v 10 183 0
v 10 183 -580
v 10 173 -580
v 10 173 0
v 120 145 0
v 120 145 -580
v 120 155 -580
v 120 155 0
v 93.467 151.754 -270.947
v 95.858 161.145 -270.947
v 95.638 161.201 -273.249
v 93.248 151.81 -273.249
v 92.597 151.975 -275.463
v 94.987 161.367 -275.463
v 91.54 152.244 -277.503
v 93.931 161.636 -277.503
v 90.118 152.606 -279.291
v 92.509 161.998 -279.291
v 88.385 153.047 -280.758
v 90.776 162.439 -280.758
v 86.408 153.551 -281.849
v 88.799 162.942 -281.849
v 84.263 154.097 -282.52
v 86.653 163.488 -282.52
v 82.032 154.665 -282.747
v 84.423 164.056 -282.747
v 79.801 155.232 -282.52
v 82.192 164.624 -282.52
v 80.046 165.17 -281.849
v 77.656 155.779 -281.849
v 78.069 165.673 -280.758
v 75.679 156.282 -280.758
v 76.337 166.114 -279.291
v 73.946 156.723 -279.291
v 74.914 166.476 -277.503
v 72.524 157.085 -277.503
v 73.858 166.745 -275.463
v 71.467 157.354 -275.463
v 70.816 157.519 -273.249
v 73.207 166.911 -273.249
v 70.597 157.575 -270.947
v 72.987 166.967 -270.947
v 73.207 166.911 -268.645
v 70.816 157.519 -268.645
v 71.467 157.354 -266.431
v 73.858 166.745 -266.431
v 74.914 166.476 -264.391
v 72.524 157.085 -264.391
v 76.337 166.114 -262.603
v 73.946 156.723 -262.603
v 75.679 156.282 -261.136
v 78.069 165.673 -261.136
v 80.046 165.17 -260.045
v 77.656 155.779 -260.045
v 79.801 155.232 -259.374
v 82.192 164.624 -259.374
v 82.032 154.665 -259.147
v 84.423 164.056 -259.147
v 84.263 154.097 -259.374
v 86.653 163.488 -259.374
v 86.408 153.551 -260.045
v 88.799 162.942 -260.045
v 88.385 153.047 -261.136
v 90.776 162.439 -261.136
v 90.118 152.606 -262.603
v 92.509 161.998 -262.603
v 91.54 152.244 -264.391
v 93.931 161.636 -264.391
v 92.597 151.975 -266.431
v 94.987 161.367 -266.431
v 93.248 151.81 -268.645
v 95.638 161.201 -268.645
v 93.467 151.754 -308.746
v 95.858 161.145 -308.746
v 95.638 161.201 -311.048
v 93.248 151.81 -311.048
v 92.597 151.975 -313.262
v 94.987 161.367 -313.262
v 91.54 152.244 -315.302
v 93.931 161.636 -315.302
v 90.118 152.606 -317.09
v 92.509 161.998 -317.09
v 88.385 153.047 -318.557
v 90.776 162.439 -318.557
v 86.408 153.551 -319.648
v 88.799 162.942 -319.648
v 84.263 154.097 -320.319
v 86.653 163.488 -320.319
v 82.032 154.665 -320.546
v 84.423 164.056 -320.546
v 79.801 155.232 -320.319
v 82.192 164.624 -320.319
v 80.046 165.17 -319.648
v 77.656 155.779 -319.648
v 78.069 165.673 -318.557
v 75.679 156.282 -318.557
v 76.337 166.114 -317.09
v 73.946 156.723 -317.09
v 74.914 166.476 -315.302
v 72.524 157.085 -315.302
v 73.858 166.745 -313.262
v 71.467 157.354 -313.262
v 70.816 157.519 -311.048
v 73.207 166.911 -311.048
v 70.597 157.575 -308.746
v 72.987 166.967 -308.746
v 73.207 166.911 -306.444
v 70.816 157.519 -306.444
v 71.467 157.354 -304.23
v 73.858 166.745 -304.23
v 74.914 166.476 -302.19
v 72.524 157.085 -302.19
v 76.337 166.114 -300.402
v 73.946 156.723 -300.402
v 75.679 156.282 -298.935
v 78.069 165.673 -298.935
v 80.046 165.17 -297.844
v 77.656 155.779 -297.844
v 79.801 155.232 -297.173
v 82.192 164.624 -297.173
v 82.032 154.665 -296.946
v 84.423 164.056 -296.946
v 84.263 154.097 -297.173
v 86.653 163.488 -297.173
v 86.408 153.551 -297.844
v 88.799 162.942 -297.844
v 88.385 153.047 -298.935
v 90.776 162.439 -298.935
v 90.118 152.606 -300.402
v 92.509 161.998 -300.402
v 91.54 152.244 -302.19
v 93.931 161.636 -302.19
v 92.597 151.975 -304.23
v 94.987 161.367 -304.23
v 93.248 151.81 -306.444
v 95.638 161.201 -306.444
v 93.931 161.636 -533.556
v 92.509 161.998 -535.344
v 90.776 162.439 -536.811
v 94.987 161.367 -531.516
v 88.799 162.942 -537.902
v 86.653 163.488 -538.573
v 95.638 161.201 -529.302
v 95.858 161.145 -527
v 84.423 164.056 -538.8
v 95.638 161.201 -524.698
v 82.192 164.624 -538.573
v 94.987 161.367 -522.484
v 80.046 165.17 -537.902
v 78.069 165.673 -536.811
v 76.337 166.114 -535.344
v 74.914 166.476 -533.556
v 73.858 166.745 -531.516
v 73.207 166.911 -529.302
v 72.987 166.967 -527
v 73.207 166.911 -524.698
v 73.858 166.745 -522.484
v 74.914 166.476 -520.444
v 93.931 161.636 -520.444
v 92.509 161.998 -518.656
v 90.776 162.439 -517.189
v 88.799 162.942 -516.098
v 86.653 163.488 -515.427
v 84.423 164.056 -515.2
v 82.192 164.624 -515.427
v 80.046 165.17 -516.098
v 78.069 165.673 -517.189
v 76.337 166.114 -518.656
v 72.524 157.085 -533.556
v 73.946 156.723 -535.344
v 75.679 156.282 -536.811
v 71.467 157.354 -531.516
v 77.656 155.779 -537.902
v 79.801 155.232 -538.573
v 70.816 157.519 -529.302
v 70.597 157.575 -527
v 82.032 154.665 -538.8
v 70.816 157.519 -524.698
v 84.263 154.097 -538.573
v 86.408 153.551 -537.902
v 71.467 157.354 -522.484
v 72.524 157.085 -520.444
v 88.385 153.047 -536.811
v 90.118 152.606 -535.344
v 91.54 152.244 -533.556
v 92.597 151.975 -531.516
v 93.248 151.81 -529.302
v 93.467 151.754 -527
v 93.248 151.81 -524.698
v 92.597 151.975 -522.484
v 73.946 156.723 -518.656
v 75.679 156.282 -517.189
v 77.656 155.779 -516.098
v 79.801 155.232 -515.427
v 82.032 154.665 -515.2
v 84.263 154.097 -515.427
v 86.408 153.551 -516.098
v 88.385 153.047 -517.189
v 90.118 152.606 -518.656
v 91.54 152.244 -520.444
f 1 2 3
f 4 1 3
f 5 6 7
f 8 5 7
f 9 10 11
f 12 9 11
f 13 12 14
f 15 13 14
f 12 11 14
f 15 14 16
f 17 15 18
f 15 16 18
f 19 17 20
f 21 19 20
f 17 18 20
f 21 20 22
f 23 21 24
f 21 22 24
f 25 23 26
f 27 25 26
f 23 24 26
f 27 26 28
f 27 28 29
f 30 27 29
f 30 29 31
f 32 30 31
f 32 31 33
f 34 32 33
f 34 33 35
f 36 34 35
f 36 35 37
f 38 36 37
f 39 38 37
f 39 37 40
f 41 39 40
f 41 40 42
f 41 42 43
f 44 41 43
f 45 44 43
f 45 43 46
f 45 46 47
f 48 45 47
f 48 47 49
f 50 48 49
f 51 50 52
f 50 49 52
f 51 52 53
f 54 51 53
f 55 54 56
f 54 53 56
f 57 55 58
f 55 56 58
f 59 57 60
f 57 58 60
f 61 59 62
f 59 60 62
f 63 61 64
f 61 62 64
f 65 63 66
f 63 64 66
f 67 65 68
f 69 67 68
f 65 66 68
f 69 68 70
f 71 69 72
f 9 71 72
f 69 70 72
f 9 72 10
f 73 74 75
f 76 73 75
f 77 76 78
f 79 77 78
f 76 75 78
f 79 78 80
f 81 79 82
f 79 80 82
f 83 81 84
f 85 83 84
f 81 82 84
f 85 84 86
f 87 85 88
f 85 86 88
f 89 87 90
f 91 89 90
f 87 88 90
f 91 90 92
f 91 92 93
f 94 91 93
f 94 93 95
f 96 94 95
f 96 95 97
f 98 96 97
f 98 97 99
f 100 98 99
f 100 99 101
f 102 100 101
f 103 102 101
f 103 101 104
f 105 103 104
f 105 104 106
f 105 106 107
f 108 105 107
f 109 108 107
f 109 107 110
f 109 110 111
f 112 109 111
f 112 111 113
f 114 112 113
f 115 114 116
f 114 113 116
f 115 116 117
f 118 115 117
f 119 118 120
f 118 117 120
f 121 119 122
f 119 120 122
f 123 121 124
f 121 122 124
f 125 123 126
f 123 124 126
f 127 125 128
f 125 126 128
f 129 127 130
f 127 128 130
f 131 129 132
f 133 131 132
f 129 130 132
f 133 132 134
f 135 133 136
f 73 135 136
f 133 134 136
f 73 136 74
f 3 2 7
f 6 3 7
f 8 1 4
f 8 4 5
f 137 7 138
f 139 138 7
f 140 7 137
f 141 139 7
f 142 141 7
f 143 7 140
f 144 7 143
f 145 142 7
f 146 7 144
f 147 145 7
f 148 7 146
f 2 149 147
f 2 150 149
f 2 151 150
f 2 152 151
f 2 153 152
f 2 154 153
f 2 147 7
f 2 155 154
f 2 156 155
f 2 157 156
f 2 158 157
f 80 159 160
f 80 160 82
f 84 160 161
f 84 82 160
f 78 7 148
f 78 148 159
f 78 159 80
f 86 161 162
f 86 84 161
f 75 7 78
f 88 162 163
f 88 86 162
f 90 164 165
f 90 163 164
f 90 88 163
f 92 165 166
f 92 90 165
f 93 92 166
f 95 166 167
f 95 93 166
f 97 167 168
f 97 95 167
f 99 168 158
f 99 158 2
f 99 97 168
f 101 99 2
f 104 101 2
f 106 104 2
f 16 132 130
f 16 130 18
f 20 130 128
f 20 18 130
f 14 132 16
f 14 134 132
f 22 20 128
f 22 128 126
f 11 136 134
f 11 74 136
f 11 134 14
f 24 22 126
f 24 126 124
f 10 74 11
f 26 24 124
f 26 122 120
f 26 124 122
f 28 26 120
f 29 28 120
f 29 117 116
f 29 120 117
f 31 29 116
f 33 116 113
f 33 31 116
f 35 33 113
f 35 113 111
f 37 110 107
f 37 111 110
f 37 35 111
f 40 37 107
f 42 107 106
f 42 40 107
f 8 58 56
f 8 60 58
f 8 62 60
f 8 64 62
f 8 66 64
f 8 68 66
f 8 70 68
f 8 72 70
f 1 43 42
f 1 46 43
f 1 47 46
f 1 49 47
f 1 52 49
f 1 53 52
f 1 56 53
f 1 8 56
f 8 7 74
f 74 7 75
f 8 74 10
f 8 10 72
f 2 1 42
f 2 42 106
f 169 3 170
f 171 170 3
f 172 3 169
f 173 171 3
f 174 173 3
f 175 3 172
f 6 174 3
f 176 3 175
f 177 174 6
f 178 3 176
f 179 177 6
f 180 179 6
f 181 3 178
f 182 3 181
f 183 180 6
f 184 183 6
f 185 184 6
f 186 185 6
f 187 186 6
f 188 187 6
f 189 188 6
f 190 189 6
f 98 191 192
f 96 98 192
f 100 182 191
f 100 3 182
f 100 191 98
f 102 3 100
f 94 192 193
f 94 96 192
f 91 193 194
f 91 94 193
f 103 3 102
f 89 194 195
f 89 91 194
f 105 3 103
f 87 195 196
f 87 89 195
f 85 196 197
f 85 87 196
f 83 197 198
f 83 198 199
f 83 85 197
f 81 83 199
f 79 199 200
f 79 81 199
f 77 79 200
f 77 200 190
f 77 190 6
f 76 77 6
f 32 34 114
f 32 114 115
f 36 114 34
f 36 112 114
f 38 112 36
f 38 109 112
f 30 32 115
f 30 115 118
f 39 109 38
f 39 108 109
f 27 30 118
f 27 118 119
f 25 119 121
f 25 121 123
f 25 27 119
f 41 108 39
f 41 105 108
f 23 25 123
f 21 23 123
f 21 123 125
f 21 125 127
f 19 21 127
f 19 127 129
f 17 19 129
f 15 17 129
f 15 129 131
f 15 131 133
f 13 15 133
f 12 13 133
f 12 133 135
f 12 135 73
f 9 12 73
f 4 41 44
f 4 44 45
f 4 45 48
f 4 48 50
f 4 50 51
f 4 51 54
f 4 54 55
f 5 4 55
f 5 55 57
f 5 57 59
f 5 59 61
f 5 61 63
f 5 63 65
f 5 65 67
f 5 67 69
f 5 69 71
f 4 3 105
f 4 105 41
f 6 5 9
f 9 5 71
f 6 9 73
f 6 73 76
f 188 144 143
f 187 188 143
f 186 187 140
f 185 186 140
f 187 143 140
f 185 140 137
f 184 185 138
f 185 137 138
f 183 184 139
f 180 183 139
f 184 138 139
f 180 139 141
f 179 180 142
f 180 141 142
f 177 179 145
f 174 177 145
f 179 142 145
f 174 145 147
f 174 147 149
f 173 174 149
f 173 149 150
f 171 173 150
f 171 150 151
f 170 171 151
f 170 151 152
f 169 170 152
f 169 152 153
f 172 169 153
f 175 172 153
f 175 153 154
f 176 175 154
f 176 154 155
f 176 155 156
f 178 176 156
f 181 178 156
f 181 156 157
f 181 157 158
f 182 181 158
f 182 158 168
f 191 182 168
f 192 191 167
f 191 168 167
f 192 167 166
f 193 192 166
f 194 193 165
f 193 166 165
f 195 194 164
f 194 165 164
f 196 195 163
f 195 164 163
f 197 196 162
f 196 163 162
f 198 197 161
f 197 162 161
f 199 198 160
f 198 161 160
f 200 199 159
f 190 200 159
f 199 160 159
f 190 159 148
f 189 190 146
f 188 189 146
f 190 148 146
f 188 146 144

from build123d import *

# Parameters (mm, degrees)
BOSS_EXTRU_1_DEPTH      = 580
ESQUISSE2_R             = 11.8
ENL_V_MAT_EXTRU_1_DEPTH = 10


with BuildPart() as part:
    # Esquisse1 → Boss.-Extru.1 (new body)
    with BuildSketch(Plane.XY):
        Polygon((120, 155), (10, 183), (10, 173), (120, 145), align=None)
    extrude(amount=-BOSS_EXTRU_1_DEPTH)

    # Esquisse2 → Enlèv. mat.-Extru.1 (cut)
    with BuildSketch(Plane(origin=(44.355790127, 174.254889786, 0), x_dir=(0.969097174, -0.246679281, 0), z_dir=(0.246679281, 0.969097174, 0))):
        with Locations((41.344408766, 308.745926628)):
            Circle(ESQUISSE2_R)
        with Locations((41.344408766, 270.946985721)):
            Circle(ESQUISSE2_R)
        with Locations((41.344408766, 527)):
            Circle(ESQUISSE2_R)
    extrude(amount=-ENL_V_MAT_EXTRU_1_DEPTH, mode=Mode.SUBTRACT)


solid = part.part
